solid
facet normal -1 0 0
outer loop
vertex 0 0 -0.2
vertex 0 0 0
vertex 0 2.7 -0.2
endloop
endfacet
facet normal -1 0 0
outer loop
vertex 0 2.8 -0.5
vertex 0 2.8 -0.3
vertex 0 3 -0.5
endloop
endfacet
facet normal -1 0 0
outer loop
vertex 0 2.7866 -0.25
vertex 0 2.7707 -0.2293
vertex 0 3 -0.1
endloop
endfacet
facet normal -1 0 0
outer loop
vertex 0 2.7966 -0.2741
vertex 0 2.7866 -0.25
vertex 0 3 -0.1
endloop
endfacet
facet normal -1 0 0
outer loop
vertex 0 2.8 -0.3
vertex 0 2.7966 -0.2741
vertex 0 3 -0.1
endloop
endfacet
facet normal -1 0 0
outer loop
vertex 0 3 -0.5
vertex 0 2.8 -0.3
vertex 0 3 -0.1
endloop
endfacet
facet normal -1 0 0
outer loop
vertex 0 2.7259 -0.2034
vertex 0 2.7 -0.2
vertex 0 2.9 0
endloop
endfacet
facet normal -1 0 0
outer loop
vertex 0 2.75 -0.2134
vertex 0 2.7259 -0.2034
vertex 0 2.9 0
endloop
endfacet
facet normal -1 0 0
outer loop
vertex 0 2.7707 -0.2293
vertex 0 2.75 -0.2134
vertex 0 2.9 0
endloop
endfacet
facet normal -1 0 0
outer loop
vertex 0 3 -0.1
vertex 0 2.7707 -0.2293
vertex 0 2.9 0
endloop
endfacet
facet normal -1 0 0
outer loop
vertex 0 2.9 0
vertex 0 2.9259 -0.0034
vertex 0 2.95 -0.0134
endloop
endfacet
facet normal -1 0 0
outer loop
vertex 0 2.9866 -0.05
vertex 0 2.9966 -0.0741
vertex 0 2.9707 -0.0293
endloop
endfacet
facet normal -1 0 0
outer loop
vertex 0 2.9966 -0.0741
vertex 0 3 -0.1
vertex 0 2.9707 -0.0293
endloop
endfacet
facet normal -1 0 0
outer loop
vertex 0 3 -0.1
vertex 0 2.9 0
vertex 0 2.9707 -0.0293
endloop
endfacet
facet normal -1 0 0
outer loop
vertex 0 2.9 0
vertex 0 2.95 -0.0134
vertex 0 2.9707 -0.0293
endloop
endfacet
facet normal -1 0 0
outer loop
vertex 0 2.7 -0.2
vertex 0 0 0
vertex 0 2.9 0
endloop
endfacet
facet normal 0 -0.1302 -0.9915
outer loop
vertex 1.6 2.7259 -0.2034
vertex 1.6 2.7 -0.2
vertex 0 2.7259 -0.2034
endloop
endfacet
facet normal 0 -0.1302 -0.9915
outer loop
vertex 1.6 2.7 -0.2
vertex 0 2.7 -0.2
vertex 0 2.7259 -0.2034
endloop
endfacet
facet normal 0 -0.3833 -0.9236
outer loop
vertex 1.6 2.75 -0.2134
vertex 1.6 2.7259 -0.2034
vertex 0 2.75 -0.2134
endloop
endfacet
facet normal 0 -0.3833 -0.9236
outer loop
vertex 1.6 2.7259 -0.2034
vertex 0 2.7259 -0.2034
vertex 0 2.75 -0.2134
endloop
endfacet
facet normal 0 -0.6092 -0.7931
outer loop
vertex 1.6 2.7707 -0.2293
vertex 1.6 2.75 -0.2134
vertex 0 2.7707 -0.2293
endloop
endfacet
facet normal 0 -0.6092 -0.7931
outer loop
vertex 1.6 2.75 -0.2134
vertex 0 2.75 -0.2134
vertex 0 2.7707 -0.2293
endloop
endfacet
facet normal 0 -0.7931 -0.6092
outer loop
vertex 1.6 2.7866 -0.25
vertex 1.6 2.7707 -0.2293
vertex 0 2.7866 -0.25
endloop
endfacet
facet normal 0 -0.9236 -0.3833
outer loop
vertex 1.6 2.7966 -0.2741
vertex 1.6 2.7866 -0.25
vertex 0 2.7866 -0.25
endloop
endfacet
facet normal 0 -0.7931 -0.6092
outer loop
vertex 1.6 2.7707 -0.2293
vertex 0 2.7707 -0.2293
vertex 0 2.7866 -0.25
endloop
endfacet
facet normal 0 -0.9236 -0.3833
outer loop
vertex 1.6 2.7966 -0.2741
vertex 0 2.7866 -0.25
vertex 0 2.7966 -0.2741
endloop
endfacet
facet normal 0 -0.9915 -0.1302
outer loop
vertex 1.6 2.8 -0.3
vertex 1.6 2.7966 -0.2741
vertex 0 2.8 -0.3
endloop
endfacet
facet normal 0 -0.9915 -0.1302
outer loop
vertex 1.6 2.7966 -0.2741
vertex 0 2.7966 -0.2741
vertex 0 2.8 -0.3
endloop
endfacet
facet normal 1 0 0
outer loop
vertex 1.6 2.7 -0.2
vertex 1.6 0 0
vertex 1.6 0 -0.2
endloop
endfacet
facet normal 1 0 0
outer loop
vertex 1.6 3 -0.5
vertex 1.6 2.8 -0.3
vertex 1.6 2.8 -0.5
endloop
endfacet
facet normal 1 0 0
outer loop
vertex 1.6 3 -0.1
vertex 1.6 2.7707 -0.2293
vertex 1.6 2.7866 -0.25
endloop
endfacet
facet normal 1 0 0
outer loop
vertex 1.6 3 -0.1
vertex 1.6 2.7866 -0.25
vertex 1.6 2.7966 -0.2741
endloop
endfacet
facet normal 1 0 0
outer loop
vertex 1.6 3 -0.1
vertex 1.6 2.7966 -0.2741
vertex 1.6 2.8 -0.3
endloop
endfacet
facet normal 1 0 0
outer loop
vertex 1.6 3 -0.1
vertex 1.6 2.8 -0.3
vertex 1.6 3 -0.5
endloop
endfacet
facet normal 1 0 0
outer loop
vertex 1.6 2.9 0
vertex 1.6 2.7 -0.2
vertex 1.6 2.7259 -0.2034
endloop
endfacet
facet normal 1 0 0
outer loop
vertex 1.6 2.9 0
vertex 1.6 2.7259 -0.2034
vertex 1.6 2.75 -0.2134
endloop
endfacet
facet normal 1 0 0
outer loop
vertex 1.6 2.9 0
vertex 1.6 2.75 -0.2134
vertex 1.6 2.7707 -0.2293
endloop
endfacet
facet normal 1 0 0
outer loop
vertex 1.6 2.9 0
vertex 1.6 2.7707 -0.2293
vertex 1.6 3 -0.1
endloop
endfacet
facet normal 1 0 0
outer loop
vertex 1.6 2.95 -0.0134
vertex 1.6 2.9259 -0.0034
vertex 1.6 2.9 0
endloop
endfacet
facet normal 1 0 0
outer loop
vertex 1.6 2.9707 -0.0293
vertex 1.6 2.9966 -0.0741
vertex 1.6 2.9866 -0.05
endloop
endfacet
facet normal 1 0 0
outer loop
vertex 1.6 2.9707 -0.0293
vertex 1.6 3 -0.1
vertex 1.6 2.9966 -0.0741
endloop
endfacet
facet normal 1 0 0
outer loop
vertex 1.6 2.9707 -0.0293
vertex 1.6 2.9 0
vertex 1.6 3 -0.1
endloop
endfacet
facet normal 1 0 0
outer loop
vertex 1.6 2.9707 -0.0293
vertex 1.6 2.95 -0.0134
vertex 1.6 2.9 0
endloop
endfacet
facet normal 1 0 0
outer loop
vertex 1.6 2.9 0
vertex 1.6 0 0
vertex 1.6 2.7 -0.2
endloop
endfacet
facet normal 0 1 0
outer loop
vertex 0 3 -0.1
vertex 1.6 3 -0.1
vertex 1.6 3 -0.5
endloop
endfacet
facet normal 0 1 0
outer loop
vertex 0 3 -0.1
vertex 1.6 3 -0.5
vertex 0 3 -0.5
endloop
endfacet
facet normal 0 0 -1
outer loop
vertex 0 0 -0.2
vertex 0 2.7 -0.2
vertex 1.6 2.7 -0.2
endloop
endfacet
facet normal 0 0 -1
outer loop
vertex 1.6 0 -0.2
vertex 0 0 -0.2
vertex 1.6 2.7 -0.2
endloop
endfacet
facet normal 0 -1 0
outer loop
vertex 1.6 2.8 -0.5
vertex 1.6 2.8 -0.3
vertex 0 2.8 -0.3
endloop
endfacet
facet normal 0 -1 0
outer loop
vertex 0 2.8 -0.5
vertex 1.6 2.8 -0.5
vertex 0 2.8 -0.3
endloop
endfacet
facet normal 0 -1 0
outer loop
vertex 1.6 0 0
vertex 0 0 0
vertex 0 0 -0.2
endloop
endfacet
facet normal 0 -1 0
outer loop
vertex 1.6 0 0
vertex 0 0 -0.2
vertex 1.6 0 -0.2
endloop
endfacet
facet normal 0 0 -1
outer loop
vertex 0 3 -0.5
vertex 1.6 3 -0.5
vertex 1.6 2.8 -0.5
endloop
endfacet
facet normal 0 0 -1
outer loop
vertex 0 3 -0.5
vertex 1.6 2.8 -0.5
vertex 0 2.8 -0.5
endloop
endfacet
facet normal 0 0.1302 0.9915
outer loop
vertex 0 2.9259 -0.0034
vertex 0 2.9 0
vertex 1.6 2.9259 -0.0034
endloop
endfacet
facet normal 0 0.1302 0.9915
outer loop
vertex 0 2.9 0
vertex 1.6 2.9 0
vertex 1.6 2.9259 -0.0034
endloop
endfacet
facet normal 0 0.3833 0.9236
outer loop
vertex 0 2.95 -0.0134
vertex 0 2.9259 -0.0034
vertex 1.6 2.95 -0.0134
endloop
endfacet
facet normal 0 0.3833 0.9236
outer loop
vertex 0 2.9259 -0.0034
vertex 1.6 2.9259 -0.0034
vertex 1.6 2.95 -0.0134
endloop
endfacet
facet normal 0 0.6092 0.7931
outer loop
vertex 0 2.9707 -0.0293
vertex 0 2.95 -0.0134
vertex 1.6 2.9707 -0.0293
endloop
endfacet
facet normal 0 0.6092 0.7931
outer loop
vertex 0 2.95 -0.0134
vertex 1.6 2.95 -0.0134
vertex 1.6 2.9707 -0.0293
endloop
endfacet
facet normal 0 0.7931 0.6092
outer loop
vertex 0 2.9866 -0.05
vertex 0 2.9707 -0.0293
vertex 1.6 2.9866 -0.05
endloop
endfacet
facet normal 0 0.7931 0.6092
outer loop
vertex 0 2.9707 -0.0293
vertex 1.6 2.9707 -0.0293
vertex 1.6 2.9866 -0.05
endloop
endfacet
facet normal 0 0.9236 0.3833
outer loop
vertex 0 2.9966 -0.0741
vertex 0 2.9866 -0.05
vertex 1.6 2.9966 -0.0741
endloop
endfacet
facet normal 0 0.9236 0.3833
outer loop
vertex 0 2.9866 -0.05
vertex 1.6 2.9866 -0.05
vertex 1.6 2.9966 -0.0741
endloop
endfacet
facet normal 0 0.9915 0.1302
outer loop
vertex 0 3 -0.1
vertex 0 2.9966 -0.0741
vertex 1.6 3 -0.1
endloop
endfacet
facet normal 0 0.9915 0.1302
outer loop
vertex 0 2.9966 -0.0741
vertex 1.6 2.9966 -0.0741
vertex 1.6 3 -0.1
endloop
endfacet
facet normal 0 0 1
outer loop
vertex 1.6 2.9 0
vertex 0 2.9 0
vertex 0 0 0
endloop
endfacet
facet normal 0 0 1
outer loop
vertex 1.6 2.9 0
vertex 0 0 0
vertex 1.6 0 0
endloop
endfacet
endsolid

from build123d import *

# Parameters (mm, degrees)
ESQUISSE1_W        = 1.6
ESQUISSE1_H        = 3
BOSS_EXTRU_1_DEPTH = 0.2
ESQUISSE2_W        = 1.6
ESQUISSE2_H        = 0.2
BOSS_EXTRU_2_DEPTH = 0.3
CONG_1_R           = 0.1


with BuildPart() as part:
    # Esquisse1 → Boss.-Extru.1 (new body)
    with BuildSketch(Plane.XY):
        with Locations((0.8, 1.5)):
            Rectangle(ESQUISSE1_W, ESQUISSE1_H)
    extrude(amount=-BOSS_EXTRU_1_DEPTH)

    # Esquisse2 → Boss.-Extru.2 (add)
    with BuildSketch(Plane(origin=(0, 0, -0.2), x_dir=(-1, 0, 0), z_dir=(0, 0, -1))):
        with Locations((-0.8, 2.9)):
            Rectangle(ESQUISSE2_W, ESQUISSE2_H)
    extrude(amount=BOSS_EXTRU_2_DEPTH)

    # Congé1
    cong_1_edges = [part.edges().sort_by_distance(p)[0] for p in [
        (0.8, 3, 0),
        (0.8, 2.8, -0.2),
    ]]
    fillet(cong_1_edges, radius=CONG_1_R)


solid = part.part
